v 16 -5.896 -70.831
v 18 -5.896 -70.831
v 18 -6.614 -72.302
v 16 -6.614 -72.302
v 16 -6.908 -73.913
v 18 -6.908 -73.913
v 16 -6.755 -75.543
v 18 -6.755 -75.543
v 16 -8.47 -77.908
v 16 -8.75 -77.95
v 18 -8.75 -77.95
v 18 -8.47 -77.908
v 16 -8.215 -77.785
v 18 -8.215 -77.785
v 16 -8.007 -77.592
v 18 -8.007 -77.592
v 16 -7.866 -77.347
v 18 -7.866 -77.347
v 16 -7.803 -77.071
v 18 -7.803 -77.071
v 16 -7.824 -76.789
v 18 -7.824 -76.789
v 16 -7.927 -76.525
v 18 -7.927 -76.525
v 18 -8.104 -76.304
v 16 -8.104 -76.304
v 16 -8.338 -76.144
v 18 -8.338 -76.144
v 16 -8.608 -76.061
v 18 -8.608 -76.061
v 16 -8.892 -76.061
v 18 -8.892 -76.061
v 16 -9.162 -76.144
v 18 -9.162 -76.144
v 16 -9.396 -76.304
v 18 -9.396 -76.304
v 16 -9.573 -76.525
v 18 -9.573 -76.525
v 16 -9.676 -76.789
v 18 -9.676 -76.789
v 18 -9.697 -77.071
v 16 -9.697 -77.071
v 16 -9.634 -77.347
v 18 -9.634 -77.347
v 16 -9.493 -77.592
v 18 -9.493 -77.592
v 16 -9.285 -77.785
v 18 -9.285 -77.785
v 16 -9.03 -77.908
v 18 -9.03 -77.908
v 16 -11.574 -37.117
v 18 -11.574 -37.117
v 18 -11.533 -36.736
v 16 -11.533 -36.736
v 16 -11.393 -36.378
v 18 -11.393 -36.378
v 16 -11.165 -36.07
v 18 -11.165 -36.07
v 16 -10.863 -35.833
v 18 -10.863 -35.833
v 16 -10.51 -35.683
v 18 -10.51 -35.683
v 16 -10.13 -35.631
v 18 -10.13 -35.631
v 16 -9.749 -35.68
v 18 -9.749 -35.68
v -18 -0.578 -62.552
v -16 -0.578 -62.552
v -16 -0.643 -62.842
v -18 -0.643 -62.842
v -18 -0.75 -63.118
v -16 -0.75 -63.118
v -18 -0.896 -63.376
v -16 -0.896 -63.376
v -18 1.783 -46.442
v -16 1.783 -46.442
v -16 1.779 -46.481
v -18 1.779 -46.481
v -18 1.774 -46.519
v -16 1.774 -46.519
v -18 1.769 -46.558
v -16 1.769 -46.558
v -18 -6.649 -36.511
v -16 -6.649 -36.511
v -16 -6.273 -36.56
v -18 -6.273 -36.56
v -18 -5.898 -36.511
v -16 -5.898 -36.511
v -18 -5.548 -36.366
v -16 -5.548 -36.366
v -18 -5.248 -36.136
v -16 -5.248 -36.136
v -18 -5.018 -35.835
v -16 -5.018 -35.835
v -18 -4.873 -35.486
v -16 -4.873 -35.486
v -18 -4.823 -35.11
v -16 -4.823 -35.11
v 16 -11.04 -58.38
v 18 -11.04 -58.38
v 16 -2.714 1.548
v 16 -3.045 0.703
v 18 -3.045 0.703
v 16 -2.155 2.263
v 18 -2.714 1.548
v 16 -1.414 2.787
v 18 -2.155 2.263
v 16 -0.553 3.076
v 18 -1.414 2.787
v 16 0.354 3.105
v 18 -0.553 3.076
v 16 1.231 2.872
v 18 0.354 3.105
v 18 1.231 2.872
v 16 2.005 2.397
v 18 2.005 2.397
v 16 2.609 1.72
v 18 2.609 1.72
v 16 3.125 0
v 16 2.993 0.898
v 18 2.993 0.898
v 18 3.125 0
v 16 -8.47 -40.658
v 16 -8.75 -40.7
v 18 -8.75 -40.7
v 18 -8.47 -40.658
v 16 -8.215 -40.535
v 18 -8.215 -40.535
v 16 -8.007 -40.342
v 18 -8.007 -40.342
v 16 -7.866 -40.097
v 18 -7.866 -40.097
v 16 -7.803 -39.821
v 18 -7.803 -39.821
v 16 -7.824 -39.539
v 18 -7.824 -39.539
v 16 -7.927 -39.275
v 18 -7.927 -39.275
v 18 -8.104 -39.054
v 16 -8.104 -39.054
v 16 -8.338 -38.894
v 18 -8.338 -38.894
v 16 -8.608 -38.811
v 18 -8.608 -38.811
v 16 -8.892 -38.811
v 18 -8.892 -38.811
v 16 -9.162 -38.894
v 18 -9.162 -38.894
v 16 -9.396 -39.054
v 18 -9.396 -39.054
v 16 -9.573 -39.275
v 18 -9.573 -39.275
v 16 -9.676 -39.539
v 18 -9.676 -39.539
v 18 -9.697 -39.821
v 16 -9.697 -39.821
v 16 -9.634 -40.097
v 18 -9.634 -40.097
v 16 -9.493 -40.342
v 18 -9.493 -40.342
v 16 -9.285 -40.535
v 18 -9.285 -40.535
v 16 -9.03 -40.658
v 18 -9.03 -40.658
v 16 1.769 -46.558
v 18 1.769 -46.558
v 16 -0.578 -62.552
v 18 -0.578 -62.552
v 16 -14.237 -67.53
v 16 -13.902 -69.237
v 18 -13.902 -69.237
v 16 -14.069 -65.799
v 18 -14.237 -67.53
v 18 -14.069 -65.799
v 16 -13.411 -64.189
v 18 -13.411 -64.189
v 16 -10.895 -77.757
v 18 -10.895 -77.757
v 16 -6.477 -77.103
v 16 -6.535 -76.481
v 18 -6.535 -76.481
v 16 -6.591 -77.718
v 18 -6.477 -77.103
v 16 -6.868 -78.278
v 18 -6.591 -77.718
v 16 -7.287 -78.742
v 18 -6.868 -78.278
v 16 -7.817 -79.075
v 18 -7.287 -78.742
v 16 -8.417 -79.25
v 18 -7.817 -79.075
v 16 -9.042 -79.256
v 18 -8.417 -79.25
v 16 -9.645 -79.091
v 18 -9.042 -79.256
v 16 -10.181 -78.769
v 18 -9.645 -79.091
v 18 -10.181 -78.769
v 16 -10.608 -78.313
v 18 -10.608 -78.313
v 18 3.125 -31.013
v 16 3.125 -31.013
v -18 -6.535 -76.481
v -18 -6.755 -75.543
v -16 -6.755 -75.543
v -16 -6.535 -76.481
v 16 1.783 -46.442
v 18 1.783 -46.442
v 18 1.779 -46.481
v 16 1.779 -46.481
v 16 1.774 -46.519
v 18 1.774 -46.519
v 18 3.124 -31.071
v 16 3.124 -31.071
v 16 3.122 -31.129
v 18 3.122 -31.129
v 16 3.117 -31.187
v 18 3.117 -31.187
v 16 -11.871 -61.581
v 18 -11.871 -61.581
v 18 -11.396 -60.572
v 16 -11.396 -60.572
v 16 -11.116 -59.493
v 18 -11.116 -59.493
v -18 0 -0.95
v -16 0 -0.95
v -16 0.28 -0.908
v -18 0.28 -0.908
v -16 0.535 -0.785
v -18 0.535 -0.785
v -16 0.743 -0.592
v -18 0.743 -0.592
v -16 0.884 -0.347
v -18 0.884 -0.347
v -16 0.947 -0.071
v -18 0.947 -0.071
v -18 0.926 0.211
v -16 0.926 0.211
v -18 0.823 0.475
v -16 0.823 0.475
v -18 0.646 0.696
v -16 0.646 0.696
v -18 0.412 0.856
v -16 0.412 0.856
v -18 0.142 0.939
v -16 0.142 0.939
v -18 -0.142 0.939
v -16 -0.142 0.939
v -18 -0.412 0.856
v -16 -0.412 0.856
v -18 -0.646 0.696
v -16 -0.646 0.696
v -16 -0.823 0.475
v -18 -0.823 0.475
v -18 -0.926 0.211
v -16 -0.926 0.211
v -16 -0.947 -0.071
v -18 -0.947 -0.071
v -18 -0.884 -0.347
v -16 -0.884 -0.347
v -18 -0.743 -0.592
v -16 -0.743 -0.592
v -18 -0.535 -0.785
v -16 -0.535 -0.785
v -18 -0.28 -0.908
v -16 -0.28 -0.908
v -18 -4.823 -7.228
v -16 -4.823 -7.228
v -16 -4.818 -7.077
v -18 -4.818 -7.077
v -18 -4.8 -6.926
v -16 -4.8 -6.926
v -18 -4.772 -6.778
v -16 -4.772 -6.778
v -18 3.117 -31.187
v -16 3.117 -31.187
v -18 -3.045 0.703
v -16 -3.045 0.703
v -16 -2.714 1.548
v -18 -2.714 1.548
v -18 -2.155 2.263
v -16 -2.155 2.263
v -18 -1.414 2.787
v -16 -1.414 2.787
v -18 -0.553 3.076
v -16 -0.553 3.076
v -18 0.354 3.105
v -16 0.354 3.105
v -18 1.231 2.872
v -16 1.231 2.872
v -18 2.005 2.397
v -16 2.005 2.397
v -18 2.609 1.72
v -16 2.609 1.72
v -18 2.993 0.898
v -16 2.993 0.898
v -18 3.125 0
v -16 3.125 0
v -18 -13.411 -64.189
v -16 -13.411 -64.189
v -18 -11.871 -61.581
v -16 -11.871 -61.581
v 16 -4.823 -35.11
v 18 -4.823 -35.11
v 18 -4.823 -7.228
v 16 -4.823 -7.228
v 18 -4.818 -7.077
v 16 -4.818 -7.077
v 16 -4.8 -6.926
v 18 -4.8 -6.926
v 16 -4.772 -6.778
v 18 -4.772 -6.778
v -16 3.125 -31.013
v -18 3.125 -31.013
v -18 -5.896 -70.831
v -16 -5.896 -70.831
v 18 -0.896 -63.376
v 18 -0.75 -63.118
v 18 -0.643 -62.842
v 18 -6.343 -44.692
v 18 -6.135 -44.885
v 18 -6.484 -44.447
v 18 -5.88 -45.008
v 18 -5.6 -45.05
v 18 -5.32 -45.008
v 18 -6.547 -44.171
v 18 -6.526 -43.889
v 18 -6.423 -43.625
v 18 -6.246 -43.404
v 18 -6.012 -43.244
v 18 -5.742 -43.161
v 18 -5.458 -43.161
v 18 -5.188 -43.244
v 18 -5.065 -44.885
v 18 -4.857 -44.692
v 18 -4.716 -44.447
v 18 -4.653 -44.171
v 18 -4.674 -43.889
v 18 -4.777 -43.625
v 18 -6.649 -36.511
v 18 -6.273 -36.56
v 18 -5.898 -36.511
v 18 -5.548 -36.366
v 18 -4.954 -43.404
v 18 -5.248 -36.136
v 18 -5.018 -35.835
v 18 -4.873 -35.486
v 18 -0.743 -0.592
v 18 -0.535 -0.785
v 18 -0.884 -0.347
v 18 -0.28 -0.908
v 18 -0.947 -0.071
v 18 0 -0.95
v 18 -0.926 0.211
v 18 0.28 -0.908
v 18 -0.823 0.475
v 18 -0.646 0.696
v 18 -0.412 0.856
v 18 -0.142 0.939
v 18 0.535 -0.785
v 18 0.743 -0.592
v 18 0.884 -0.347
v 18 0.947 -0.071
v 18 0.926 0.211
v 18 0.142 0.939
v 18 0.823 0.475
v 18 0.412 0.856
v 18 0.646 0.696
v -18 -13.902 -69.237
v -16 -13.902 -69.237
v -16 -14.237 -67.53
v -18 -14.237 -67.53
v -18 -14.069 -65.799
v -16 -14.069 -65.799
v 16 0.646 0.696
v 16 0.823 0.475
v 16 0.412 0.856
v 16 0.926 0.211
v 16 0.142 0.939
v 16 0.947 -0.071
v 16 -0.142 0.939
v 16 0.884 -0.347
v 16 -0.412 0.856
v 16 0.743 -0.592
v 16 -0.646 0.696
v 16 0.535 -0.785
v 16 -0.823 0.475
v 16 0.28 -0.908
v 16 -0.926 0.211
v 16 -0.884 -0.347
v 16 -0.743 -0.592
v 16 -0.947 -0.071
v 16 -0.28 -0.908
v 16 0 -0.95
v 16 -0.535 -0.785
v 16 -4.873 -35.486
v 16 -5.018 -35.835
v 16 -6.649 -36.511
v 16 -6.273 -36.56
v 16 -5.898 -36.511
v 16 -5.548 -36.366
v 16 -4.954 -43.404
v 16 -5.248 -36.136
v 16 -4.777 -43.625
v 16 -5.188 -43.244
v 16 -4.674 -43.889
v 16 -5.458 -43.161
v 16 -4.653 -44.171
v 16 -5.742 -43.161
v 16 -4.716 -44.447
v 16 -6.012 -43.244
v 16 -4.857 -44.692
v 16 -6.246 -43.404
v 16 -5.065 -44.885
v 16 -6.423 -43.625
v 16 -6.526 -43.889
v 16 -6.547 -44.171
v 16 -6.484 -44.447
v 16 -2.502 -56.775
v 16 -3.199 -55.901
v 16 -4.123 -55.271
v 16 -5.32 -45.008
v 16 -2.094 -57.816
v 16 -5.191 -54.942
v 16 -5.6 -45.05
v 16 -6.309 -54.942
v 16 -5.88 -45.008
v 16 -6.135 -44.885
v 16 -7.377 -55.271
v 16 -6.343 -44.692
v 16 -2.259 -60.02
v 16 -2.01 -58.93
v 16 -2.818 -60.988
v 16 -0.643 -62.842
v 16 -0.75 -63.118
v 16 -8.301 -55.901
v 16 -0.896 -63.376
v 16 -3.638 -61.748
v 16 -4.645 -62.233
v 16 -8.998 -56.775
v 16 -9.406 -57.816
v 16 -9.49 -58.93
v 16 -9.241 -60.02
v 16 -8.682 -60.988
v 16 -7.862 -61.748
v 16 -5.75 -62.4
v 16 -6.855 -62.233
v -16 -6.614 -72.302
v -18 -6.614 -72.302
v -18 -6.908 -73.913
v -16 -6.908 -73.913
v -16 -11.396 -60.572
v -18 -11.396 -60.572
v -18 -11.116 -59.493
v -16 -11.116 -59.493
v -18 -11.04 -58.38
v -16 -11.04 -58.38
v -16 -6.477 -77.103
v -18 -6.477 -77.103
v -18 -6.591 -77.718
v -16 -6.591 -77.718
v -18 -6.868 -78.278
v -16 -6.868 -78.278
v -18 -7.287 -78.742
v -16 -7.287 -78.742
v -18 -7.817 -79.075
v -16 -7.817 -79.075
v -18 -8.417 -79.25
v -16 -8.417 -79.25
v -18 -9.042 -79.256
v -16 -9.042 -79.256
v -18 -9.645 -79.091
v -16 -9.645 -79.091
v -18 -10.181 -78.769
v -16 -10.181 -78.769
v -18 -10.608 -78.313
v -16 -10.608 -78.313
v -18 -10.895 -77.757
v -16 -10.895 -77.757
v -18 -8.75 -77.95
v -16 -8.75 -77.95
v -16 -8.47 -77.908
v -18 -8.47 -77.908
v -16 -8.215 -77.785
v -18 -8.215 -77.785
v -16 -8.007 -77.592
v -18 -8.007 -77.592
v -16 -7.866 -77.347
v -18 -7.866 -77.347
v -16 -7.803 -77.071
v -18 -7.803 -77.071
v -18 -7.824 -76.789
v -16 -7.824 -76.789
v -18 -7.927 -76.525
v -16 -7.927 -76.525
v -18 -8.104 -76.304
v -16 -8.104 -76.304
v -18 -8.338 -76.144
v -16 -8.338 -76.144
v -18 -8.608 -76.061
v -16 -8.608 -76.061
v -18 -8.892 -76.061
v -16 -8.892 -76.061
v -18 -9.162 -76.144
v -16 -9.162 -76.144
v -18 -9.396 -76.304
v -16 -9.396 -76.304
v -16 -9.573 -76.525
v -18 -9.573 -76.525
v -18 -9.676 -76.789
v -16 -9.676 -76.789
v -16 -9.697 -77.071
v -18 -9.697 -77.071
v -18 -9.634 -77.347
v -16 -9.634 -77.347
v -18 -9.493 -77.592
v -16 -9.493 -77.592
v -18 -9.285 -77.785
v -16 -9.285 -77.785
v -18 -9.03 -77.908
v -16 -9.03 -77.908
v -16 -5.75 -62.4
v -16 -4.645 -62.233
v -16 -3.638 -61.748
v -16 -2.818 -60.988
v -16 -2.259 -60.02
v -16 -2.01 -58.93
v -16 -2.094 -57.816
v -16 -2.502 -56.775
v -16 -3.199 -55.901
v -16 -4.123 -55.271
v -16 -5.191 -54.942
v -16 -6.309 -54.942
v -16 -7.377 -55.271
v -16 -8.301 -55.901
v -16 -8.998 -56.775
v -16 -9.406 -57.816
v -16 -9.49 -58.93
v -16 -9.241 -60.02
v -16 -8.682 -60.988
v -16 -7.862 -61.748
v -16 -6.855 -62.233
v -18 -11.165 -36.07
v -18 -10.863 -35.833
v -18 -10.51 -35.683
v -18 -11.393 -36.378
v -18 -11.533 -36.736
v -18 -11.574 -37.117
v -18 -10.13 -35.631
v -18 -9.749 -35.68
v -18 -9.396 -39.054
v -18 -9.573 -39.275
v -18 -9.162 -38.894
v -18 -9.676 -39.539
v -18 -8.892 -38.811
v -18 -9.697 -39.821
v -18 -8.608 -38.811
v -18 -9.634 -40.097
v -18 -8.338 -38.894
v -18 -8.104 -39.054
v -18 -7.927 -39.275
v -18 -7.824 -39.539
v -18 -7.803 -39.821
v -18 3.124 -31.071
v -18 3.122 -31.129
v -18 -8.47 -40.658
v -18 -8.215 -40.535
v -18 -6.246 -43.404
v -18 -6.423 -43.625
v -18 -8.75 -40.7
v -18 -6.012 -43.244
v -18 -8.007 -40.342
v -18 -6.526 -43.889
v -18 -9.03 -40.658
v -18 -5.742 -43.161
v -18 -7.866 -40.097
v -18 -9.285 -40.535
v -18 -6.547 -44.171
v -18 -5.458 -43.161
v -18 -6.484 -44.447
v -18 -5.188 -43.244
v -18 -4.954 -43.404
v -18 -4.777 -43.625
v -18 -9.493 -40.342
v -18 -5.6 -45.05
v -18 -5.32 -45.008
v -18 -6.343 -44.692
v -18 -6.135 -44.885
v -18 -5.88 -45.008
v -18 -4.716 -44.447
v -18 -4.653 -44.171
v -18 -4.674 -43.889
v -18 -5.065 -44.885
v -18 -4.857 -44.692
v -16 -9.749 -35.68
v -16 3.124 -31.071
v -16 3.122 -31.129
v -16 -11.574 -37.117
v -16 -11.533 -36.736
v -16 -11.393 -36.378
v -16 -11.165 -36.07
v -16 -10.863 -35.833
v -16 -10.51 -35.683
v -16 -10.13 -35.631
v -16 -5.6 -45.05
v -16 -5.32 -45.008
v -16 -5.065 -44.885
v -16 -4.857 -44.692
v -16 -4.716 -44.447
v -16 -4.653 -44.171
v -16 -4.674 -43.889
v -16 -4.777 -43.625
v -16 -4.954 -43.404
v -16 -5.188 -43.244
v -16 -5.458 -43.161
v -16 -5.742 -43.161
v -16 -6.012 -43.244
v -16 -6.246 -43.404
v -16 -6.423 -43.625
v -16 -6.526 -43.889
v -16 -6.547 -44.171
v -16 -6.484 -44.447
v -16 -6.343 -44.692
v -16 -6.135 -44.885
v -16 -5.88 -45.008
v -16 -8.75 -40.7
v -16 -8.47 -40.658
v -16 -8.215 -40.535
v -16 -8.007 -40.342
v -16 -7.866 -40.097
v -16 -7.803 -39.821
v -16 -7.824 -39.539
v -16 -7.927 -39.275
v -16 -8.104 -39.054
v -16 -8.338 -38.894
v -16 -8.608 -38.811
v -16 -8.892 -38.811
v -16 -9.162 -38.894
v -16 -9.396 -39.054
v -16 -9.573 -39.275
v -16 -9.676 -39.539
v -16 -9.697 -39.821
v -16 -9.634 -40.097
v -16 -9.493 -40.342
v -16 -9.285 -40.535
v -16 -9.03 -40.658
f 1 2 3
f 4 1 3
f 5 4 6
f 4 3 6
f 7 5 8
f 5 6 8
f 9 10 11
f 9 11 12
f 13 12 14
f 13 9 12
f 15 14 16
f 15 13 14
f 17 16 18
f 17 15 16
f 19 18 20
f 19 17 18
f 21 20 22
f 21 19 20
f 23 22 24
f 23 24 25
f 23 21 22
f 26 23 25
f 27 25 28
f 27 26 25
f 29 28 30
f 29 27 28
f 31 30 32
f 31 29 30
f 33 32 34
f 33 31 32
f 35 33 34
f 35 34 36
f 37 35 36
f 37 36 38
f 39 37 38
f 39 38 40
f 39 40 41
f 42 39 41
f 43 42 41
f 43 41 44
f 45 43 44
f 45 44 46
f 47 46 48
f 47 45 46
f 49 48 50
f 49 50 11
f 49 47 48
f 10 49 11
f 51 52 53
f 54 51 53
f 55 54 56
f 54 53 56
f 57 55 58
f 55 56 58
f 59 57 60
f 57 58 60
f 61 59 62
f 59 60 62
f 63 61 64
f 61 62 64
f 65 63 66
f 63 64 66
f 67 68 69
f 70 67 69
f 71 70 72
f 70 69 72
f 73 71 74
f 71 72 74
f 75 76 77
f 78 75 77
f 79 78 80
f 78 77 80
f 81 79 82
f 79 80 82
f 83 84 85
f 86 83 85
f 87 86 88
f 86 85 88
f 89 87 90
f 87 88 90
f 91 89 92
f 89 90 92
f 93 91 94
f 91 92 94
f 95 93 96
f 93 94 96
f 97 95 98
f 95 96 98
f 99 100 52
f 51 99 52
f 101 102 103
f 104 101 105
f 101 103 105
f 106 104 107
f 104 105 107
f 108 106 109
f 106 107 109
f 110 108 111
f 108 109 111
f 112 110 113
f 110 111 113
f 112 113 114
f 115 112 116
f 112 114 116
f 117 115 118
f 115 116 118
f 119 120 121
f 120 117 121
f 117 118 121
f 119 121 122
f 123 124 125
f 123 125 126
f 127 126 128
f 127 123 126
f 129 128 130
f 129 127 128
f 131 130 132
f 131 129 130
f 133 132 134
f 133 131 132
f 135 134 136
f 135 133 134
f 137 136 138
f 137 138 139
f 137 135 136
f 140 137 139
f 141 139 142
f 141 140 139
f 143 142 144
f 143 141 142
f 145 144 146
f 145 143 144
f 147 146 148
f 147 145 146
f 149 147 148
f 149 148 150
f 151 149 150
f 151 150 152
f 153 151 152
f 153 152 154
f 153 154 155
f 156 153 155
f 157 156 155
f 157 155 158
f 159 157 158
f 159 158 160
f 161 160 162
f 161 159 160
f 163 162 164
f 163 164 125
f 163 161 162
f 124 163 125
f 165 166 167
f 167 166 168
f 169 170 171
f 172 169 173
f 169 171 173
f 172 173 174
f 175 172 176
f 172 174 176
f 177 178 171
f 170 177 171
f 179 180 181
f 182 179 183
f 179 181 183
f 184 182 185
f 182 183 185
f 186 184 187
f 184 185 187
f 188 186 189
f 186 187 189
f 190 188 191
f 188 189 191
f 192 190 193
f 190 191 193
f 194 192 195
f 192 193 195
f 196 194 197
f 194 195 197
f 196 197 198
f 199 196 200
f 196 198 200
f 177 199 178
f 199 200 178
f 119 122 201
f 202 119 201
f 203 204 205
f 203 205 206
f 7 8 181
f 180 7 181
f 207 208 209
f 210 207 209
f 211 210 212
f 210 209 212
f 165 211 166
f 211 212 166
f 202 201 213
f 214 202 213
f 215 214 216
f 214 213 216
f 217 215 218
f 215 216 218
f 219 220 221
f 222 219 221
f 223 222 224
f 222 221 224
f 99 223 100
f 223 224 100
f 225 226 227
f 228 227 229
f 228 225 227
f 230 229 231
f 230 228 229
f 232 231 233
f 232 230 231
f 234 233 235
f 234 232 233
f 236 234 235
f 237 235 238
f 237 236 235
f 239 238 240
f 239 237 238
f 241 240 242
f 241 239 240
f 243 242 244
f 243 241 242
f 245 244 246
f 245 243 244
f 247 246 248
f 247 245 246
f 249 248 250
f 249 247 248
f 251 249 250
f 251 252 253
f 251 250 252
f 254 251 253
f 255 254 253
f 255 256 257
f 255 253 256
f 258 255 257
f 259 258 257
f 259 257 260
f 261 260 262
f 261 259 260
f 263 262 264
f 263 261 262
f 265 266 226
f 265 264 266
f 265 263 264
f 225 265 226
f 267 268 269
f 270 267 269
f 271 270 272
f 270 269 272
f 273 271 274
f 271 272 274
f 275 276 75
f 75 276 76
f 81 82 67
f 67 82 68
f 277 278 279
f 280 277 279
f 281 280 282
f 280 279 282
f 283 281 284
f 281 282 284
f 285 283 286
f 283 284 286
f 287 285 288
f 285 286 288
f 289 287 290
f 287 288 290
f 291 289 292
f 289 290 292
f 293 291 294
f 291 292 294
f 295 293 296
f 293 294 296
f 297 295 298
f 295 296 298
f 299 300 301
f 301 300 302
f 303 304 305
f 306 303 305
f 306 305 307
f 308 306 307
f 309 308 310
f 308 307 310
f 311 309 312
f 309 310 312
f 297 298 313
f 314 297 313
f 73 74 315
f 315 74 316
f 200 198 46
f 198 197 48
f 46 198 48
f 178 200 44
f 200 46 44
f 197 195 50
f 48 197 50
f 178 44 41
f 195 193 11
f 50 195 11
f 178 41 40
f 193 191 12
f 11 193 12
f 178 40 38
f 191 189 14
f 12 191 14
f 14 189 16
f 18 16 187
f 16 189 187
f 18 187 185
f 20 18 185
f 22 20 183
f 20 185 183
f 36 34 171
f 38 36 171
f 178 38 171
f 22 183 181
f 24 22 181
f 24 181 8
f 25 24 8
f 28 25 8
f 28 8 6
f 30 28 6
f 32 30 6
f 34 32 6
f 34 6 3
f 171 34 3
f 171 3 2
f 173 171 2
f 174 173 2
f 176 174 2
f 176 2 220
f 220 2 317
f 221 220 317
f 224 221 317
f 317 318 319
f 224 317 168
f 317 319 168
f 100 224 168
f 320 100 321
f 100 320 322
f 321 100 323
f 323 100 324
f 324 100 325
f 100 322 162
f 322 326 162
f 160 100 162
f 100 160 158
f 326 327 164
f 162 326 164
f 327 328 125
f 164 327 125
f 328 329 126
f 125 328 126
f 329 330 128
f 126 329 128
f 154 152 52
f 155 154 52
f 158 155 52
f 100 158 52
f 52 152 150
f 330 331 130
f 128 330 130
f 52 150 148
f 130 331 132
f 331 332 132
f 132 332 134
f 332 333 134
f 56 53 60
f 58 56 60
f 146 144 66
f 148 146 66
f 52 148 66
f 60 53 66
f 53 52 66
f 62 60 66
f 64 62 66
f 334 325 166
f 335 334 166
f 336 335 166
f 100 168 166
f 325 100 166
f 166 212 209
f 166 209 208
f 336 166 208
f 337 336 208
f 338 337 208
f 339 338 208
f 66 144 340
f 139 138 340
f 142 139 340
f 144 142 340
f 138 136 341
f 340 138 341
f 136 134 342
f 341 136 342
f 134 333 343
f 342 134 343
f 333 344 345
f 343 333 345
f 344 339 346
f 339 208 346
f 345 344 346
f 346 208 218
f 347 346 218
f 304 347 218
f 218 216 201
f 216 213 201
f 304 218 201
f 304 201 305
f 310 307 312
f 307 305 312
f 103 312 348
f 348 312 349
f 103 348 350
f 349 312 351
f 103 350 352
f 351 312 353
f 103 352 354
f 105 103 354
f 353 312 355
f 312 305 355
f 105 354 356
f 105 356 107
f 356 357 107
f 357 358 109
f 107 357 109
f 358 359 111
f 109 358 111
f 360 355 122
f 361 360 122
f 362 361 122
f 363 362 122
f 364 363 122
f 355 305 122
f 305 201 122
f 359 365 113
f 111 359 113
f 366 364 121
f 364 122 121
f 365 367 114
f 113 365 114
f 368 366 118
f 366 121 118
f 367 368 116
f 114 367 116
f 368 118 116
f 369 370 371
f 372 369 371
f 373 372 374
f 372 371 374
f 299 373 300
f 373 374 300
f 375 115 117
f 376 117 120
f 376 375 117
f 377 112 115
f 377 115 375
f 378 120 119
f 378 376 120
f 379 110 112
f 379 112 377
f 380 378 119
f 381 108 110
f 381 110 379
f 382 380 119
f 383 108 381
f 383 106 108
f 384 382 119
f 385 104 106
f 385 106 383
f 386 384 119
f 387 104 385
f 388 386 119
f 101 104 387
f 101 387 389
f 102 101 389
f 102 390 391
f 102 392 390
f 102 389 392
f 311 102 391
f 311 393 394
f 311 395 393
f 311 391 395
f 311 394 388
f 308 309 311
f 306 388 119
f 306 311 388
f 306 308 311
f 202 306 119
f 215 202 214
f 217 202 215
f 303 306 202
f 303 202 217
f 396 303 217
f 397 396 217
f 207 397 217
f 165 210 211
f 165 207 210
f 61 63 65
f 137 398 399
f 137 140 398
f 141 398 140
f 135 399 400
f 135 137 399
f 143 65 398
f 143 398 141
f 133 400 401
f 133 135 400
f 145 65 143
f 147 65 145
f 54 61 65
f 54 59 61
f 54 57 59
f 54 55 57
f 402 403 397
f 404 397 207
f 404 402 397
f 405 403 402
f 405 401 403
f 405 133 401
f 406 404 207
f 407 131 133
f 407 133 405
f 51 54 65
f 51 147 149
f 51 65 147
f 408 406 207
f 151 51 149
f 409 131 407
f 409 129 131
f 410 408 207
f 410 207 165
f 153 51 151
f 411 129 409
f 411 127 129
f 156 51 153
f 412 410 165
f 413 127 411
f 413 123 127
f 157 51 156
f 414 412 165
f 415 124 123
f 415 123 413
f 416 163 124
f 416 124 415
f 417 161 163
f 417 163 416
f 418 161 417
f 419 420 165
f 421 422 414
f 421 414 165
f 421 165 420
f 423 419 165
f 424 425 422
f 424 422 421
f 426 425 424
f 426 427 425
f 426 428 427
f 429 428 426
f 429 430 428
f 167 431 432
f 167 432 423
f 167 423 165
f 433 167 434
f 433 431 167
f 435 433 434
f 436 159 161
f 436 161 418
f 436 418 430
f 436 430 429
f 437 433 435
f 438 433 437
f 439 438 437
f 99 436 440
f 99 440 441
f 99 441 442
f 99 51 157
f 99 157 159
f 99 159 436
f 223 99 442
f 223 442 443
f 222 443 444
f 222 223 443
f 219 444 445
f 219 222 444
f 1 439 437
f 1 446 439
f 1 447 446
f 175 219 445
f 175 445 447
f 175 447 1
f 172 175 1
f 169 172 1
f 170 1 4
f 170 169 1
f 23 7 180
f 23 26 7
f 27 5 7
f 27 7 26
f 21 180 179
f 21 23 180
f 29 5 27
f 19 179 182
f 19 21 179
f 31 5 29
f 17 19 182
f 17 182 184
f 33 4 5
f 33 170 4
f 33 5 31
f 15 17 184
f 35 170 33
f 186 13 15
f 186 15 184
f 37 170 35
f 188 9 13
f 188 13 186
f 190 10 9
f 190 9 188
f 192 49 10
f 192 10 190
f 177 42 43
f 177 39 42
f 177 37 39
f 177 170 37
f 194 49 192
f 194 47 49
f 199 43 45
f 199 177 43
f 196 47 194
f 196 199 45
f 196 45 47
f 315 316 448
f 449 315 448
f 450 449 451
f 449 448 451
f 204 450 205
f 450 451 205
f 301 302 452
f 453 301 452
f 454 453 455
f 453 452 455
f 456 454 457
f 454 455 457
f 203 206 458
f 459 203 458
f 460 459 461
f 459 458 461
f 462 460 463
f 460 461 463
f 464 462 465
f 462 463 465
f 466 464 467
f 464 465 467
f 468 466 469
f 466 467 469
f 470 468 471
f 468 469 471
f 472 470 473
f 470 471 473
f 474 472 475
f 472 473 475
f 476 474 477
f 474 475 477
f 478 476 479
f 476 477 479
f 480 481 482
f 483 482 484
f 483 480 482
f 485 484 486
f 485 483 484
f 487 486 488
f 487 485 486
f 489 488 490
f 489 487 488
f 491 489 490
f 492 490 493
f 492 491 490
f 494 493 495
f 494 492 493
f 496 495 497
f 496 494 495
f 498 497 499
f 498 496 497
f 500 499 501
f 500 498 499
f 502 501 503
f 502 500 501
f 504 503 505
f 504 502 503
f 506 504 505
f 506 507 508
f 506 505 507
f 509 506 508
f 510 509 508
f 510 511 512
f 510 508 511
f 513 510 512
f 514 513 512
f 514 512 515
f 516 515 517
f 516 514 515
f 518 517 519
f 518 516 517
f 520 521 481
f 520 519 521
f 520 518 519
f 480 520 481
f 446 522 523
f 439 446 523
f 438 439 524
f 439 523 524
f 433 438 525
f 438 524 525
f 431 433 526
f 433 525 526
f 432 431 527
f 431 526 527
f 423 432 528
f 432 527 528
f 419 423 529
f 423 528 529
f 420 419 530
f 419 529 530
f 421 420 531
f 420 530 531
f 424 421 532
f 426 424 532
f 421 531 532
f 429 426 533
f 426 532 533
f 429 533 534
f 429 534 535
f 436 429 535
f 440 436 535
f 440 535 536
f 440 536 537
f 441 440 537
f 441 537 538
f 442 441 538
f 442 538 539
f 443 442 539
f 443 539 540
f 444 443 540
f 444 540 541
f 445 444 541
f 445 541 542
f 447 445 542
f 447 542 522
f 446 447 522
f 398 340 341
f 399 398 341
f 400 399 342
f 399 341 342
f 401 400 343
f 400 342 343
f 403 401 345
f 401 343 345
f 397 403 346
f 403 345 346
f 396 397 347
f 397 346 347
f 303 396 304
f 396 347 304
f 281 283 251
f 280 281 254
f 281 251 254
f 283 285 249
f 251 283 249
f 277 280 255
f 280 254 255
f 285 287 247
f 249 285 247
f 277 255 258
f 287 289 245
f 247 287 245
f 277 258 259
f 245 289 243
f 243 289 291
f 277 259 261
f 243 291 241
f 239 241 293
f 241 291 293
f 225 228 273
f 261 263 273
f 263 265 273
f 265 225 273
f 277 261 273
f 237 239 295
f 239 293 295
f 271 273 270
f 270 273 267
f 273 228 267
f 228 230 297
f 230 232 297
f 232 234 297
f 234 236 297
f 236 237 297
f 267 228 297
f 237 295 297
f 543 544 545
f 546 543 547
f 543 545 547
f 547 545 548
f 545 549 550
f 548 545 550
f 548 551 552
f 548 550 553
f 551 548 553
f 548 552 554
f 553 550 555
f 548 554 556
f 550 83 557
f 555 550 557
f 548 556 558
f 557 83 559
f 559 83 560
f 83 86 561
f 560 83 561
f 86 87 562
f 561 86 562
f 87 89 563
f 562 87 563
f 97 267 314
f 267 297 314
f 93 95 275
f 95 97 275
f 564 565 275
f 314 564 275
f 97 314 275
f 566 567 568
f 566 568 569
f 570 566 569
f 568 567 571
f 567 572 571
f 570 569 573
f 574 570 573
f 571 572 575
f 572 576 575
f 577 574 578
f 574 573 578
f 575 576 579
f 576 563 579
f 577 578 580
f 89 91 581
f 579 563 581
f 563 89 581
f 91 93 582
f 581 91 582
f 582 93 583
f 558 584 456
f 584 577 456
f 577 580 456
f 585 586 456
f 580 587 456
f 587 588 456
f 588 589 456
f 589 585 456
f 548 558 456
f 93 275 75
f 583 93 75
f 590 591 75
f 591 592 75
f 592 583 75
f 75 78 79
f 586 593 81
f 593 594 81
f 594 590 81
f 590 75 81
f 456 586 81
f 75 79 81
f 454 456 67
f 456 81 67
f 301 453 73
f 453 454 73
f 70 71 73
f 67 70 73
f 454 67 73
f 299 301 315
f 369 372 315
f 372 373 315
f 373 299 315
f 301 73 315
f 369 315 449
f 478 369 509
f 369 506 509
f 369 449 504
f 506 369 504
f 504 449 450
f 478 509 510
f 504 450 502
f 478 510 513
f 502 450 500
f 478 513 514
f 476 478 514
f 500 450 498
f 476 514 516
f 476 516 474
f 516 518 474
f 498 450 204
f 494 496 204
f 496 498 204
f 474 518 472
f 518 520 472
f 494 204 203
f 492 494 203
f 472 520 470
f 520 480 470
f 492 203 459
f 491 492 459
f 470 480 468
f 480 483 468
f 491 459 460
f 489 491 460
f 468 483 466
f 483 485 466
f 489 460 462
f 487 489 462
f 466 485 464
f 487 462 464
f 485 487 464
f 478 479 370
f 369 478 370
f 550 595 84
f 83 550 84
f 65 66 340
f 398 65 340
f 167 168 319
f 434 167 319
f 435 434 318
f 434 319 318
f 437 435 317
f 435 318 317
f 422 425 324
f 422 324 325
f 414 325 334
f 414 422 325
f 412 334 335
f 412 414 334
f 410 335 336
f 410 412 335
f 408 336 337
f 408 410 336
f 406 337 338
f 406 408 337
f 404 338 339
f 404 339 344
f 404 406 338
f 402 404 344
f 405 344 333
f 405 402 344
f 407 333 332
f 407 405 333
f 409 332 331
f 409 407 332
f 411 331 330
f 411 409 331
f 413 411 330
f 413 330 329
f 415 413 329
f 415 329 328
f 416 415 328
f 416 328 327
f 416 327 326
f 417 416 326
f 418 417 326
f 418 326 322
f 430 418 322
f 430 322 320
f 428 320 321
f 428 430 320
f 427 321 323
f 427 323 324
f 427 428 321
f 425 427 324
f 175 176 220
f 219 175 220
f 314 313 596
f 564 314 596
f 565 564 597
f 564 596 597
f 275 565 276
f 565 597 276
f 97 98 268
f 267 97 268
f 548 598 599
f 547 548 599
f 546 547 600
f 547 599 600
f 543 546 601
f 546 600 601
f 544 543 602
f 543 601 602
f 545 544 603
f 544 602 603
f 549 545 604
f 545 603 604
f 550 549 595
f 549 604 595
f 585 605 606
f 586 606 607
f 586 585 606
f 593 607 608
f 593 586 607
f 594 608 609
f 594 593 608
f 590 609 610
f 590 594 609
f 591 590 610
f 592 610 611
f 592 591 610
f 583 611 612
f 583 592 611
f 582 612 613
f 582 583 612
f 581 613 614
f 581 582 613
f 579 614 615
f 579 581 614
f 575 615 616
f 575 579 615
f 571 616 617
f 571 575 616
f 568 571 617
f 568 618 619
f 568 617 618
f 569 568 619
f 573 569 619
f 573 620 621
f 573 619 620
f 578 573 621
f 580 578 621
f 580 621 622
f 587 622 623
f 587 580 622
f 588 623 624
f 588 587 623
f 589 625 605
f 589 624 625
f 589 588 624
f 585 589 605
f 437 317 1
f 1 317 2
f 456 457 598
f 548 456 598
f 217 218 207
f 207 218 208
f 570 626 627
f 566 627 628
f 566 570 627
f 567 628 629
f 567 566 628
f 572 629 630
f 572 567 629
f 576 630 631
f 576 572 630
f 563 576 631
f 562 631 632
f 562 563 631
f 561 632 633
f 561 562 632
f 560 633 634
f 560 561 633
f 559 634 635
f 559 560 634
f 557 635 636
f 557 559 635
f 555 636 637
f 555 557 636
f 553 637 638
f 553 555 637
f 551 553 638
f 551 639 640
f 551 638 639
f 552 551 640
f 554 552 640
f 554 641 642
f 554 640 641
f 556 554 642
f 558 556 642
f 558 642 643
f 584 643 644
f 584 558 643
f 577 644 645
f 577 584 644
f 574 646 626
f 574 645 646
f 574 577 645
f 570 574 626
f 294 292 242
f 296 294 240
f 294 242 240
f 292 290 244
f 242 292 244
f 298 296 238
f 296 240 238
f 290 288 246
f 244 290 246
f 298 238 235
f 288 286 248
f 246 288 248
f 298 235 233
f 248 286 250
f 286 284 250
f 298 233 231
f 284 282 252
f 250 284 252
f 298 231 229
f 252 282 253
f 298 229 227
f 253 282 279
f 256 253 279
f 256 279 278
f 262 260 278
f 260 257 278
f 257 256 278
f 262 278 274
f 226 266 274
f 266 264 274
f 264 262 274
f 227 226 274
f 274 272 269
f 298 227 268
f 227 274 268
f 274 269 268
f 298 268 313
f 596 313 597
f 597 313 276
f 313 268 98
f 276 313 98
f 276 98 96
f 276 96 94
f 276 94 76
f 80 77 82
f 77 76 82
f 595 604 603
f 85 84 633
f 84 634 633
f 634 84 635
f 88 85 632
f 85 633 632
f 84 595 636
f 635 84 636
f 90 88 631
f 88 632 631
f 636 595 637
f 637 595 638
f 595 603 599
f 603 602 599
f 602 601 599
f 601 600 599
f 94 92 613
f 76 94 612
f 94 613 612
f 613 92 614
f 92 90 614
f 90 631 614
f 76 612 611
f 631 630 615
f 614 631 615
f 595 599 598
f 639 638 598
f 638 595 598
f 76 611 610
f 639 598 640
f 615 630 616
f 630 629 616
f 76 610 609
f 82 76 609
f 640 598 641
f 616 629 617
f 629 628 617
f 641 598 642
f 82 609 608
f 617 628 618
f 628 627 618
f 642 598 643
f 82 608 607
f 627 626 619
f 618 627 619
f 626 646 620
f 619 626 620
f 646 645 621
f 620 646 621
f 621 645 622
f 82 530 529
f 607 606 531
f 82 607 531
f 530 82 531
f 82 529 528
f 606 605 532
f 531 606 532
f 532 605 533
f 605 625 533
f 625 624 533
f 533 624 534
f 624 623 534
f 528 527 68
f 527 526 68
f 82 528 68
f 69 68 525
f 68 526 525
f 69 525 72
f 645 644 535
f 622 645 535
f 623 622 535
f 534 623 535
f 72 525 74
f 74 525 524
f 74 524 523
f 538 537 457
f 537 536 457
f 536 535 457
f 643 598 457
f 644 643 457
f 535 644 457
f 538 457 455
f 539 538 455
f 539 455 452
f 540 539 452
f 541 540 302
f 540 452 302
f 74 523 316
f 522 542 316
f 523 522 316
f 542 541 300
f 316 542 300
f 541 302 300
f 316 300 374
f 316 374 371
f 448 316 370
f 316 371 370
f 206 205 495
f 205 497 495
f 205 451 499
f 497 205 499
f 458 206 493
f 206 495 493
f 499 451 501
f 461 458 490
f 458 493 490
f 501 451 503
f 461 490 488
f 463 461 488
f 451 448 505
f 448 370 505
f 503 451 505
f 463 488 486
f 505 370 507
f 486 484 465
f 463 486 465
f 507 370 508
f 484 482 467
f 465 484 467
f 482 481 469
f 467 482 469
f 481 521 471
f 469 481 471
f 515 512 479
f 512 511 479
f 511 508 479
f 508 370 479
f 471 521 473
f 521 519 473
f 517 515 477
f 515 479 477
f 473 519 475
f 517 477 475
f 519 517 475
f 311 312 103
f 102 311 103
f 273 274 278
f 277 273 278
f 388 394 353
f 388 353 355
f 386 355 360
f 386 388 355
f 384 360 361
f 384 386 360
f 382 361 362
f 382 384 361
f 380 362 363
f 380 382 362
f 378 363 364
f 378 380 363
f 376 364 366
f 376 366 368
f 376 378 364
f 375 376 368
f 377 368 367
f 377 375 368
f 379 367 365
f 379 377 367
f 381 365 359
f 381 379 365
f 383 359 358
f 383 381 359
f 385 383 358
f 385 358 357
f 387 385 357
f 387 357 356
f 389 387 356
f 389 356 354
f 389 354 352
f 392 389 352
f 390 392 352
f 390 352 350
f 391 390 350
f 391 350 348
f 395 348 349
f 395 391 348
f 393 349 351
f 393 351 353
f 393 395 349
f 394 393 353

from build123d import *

# Parameters (mm, degrees)
SKETCH1_R                = 0.95
BOSS_EXTRUDE1_DEPTH      = 18
FILLET1_R                = 2
CUT_EXTRUDE1_DEPTH       = 83.531401045
CUT_EXTRUDE1_DEPTH_BACK  = 83.531401045
SKETCH2_W                = 32
SKETCH2_H                = 101.957647254
BOSS_EXTRUDE2_DEPTH      = 16
BOSS_EXTRUDE2_DEPTH_BACK = 18
SKETCH3_R                = 3.75


with BuildPart() as part:
    # Sketch1 → Boss-Extrude1 (new, symmetric)
    with BuildSketch(Plane(origin=(0, 0, 0), x_dir=(0, 0, -1), z_dir=(1, 0, 0))):
        with BuildLine():
            Line((0, 3.125), (31.1, 3.125))
            Line((31.1, 3.125), (46.5, 1.777674582))
            Line((46.5, 1.777674582), (63, -0.644122384))
            Line((63, -0.644122384), (70.830964262, -5.89639821))
            ThreePointArc((70.830964262, -5.89639821), (73.097482893, -6.816208289), (75.542765767, -6.754979641))
            Line((75.542765767, -6.754979641), (76.480663736, -6.535070013))
            ThreePointArc((76.480663736, -6.535070013), (79.183357394, -8.1108009), (77.757164464, -10.895303469))
            Line((77.757164464, -10.895303469), (69.23684377, -13.902469654))
            ThreePointArc((69.23684377, -13.902469654), (66.658598046, -14.216298138), (64.18928422, -13.41110961))
            Line((64.18928422, -13.41110961), (61.581493884, -11.871323024))
            ThreePointArc((61.581493884, -11.871323024), (60.039213852, -11.230596721), (58.380071029, -11.039801059))
            Line((58.380071029, -11.039801059), (37.117058695, -11.574311392))
            ThreePointArc((37.117058695, -11.574311392), (35.941440636, -11.021859195), (35.680027609, -9.749481703))
            Line((35.680027609, -9.749481703), (36.510915657, -6.64856529))
            ThreePointArc((36.510915657, -6.64856529), (36.260685553, -5.390573603), (35.110323209, -4.823277675))
            Line((35.110323209, -4.823277675), (7, -4.823277675))
            Line((7, -4.823277675), (-0.702972045, -3.044906452))
            ThreePointArc((-0.702972045, -3.044906452), (-3.104912049, 0.353760043), (0, 3.125))
        make_face()
        Circle(SKETCH1_R, mode=Mode.SUBTRACT)
        with Locations((77, -8.75)):
            Circle(SKETCH1_R, mode=Mode.SUBTRACT)
        with Locations((39.75, -8.75)):
            Circle(SKETCH1_R, mode=Mode.SUBTRACT)
        with Locations((44.1, -5.6)):
            Circle(SKETCH1_R, mode=Mode.SUBTRACT)
    extrude(amount=BOSS_EXTRUDE1_DEPTH, both=True)

    # Fillet1
    # the kernel refuses this fillet: 2 mm, written as the material it takes off along each edge
    with BuildSketch(Plane(origin=(18.569678042, -4.823277675, -7), x_dir=(0, 0, -1), z_dir=(-1, 0, 0))) as fillet1_piece_1:
        with BuildLine():
            CenterArc((FILLET1_R * 0.113935608302, -FILLET1_R), FILLET1_R, 90, 13)
            Line((-FILLET1_R * 0.111015446042, -FILLET1_R * 0.0256299352148), (0, 0))
            Line((0, 0), (FILLET1_R * 0.113935608302, 0))
        make_face()
    extrude(amount=37.139356083, mode=Mode.SUBTRACT)
    with BuildSketch(Plane(origin=(18.218304715, 3.125, -31.1), x_dir=(0, -0.08715574274766148, -0.9961946980917452), z_dir=(-1, 0, 0))) as fillet1_piece_2:
        with BuildLine():
            CenterArc((FILLET1_R * 0.0436609429085, FILLET1_R), FILLET1_R, 265, 5)
            Line((-FILLET1_R * 0.0434947998391, FILLET1_R * 0.00380530190825), (0, 0))
            Line((0, 0), (FILLET1_R * 0.0436609429085, 0))
        make_face()
    extrude(amount=36.436609429, mode=Mode.SUBTRACT)
    with BuildSketch(Plane(origin=(18.14621298, 1.777674582, -46.5), x_dir=(0, -0.1452196700772367, -0.9893994377513354), z_dir=(-1, 0, 0))) as fillet1_piece_3:
        with BuildLine():
            CenterArc((FILLET1_R * 0.0292425960983, FILLET1_R), FILLET1_R, 266.65, 3.35)
            Line((-FILLET1_R * 0.02919262642, FILLET1_R * 0.00170879761001), (0, 0))
            Line((0, 0), (FILLET1_R * 0.0292425960983, 0))
        make_face()
    extrude(amount=36.292425961, mode=Mode.SUBTRACT)
    with BuildSketch(Plane(origin=(19.131384491, -0.644122384, -63), x_dir=(0, -0.5570205743376945, -0.8304986934152907), z_dir=(-1, 0, 0))) as fillet1_piece_4:
        with BuildLine():
            CenterArc((FILLET1_R * 0.226276898255, FILLET1_R), FILLET1_R, 244.5, 25.5)
            Line((-FILLET1_R * 0.204234198553, FILLET1_R * 0.0974147156501), (0, 0))
            Line((0, 0), (FILLET1_R * 0.226276898255, 0))
        make_face()
    extrude(amount=38.262768983, mode=Mode.SUBTRACT)

    # Sketch2 → Cut-Extrude1 (cut, two sides: drawn at the far end of the back side and taken through both)
    with BuildSketch(Plane(origin=(0, 0, 0), x_dir=(1, 0, 0), z_dir=(0, 1, 0)).offset(-CUT_EXTRUDE1_DEPTH_BACK)):
        with Locations((0, 38.94963668)):
            Rectangle(SKETCH2_W, SKETCH2_H)
    extrude(amount=CUT_EXTRUDE1_DEPTH + CUT_EXTRUDE1_DEPTH_BACK, mode=Mode.SUBTRACT)


with BuildPart() as cut_extrude1_piece_1:
    # of the separate pieces the step leaves, piece 1, a body of its own (cut_extrude1_pieces)
    add(part.part.solids().sort_by_distance((-18, -4.823277675, -35.110323209))[0])



with BuildPart() as cut_extrude1_piece_2:
    # of the separate pieces the step leaves, piece 2, a body of its own (cut_extrude1_pieces)
    add(part.part.solids().sort_by_distance((16, -4.823277675, -35.110323209))[0])


with BuildPart() as cut_extrude1_piece_1_1:
    add(cut_extrude1_piece_1.part)

    add(cut_extrude1_piece_2.part)  # Boss-Extrude2 merges Cut-Extrude1 piece 2
    # Sketch3 → Boss-Extrude2 (add, two sides: drawn at the far end of the back side and taken through both)
    with BuildSketch(Plane(origin=(0, 0, 0), x_dir=(0, 0, -1), z_dir=(1, 0, 0)).offset(-BOSS_EXTRUDE2_DEPTH_BACK)):
        with Locations((58.65, -5.75)):
            Circle(SKETCH3_R)
    extrude(amount=BOSS_EXTRUDE2_DEPTH + BOSS_EXTRUDE2_DEPTH_BACK)


solid = cut_extrude1_piece_1_1.part
